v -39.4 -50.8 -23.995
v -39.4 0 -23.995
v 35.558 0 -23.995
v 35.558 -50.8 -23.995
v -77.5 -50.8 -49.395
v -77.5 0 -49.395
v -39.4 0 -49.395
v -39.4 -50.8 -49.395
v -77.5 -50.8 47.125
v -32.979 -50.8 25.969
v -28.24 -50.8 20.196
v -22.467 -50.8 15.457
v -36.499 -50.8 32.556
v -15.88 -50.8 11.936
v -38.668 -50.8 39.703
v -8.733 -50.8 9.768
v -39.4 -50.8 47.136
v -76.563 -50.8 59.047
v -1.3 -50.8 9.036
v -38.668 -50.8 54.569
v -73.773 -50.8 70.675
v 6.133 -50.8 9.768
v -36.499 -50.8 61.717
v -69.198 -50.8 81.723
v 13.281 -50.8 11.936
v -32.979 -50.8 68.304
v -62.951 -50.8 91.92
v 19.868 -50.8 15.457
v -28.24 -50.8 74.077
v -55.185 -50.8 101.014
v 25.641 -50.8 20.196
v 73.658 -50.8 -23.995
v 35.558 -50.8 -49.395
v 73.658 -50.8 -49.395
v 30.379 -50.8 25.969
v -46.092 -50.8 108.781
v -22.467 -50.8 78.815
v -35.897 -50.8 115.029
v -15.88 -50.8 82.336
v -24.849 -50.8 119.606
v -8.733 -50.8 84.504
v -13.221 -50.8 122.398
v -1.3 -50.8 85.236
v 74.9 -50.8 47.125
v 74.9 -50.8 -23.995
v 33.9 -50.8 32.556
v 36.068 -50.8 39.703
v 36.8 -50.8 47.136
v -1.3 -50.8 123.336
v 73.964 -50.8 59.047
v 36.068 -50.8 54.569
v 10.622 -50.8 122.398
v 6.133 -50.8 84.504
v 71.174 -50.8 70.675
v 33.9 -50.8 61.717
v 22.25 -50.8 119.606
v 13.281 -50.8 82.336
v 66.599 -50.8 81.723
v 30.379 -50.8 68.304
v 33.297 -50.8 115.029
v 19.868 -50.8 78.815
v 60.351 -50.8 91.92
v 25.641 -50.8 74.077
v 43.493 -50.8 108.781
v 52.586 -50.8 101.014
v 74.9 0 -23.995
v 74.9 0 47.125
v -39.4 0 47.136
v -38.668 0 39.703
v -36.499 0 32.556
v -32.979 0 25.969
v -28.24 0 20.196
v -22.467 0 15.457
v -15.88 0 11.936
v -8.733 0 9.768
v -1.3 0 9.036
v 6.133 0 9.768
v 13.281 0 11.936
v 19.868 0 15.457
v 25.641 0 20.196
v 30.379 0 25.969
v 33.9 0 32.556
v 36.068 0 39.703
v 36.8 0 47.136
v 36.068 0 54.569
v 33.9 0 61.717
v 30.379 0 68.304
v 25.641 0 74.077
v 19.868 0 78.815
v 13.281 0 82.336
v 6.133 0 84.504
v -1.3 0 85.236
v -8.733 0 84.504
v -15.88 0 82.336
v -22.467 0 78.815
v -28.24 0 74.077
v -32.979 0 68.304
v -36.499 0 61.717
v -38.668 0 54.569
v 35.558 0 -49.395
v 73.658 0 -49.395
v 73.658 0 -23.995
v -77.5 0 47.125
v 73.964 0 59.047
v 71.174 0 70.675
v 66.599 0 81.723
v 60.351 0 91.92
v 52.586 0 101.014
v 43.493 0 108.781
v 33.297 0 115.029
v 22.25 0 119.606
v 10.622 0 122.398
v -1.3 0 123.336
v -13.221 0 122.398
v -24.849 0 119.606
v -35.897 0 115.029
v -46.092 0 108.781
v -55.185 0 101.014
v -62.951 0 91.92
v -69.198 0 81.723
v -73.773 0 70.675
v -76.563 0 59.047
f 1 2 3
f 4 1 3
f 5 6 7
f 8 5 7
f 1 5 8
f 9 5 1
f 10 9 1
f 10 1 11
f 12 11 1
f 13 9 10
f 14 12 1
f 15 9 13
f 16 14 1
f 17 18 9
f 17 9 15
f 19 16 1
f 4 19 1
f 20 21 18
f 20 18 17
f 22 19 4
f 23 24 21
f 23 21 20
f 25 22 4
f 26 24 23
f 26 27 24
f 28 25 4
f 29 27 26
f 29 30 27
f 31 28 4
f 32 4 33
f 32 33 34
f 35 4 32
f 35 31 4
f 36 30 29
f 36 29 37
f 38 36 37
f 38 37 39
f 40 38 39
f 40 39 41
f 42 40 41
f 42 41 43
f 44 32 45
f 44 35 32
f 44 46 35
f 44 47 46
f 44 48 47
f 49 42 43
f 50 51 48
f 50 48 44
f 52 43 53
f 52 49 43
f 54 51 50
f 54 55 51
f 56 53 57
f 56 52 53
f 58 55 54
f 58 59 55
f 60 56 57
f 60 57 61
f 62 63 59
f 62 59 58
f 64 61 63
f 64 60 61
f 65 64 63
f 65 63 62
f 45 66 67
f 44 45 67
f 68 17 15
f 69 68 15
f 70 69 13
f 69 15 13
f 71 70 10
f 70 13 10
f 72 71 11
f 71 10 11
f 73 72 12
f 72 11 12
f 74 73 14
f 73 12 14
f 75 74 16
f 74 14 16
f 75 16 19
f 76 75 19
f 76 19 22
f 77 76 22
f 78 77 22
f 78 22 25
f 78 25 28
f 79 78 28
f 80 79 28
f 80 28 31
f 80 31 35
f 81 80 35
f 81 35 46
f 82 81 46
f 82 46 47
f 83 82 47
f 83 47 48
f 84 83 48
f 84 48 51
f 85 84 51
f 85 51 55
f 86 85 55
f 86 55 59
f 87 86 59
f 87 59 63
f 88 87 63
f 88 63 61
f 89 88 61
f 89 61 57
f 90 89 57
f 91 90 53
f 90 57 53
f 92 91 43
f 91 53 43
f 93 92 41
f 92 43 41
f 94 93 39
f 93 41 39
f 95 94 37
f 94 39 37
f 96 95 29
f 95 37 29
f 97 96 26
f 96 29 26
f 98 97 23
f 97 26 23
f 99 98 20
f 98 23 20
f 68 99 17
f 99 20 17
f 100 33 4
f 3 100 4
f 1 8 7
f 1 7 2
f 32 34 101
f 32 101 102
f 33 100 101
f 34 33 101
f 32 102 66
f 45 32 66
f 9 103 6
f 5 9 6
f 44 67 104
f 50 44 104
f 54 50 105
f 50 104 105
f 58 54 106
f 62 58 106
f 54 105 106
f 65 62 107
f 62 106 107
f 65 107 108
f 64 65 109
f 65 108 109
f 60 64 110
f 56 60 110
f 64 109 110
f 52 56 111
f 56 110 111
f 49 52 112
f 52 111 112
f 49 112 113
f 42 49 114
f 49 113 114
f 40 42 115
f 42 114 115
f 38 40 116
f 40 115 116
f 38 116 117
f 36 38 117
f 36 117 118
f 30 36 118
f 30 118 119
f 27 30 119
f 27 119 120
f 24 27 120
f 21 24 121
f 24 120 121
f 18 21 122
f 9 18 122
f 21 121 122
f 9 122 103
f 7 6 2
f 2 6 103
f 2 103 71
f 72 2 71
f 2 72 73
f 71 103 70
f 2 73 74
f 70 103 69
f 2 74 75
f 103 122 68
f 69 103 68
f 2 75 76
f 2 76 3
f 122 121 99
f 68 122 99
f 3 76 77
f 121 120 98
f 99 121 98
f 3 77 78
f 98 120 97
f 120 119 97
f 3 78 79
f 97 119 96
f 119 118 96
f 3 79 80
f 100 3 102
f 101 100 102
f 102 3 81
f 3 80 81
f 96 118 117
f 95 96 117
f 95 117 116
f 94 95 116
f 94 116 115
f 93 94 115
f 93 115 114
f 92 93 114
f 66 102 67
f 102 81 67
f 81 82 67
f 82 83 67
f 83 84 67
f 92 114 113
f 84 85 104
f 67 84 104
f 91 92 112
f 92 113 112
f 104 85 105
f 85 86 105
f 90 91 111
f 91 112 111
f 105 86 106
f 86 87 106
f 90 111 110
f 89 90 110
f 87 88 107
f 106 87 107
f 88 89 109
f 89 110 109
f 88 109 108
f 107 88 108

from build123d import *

# Parameters (mm, degrees)
F0_W     = 38.1
F0_H     = 25.4
F1_DEPTH = 50.8
F2_D     = 76.2


with BuildPart() as f1:
    # F0 (on Front) → F1 (new body)
    with BuildSketch(Plane.XZ):
        Polygon((-77.4996658967, 47.1252045367), (-77.4996658967, -23.9947954633), (-39.3996658967, -23.9947954633), (0.9780525733, -23.9947954633), (35.5579441879, -23.9947954633), (73.6579441879, -23.9947954633), (74.9003341033, -23.9947954633), (74.9003341033, 47.1252045367), (0, 47.1252045367), align=None)
        with Locations((-58.4496658967, -36.6947954633)):
            Rectangle(F0_W, F0_H)
        with BuildLine():
            ThreePointArc((0, 123.3252045367), (-54.7236774664, 101.4714986736), (-77.4996658967, 47.1252045367))
            Line((-77.4996658967, 47.1252045367), (0, 47.1252045367))
            Line((0, 47.1252045367), (0, 123.3252045367))
        make_face()
        with BuildLine():
            Line((0, 123.3252045367), (0, 47.1252045367))
            Line((0, 47.1252045367), (74.9003341033, 47.1252045367))
            ThreePointArc((74.9003341033, 47.1252045367), (53.0433148232, 100.5523958466), (0, 123.3252045367))
        make_face()
        with Locations((54.6079441879, -36.6947954633)):
            Rectangle(F0_W, F0_H)
    extrude(amount=F1_DEPTH)

    # F2 (through all)
    with Locations(Plane(origin=(0, 0, 0), x_dir=(1, 0, 0), z_dir=(0, 1, 0))):
        with Locations((-1.2996658967, -47.1362880764)):
            Hole(F2_D / 2)


solid = f1.part
